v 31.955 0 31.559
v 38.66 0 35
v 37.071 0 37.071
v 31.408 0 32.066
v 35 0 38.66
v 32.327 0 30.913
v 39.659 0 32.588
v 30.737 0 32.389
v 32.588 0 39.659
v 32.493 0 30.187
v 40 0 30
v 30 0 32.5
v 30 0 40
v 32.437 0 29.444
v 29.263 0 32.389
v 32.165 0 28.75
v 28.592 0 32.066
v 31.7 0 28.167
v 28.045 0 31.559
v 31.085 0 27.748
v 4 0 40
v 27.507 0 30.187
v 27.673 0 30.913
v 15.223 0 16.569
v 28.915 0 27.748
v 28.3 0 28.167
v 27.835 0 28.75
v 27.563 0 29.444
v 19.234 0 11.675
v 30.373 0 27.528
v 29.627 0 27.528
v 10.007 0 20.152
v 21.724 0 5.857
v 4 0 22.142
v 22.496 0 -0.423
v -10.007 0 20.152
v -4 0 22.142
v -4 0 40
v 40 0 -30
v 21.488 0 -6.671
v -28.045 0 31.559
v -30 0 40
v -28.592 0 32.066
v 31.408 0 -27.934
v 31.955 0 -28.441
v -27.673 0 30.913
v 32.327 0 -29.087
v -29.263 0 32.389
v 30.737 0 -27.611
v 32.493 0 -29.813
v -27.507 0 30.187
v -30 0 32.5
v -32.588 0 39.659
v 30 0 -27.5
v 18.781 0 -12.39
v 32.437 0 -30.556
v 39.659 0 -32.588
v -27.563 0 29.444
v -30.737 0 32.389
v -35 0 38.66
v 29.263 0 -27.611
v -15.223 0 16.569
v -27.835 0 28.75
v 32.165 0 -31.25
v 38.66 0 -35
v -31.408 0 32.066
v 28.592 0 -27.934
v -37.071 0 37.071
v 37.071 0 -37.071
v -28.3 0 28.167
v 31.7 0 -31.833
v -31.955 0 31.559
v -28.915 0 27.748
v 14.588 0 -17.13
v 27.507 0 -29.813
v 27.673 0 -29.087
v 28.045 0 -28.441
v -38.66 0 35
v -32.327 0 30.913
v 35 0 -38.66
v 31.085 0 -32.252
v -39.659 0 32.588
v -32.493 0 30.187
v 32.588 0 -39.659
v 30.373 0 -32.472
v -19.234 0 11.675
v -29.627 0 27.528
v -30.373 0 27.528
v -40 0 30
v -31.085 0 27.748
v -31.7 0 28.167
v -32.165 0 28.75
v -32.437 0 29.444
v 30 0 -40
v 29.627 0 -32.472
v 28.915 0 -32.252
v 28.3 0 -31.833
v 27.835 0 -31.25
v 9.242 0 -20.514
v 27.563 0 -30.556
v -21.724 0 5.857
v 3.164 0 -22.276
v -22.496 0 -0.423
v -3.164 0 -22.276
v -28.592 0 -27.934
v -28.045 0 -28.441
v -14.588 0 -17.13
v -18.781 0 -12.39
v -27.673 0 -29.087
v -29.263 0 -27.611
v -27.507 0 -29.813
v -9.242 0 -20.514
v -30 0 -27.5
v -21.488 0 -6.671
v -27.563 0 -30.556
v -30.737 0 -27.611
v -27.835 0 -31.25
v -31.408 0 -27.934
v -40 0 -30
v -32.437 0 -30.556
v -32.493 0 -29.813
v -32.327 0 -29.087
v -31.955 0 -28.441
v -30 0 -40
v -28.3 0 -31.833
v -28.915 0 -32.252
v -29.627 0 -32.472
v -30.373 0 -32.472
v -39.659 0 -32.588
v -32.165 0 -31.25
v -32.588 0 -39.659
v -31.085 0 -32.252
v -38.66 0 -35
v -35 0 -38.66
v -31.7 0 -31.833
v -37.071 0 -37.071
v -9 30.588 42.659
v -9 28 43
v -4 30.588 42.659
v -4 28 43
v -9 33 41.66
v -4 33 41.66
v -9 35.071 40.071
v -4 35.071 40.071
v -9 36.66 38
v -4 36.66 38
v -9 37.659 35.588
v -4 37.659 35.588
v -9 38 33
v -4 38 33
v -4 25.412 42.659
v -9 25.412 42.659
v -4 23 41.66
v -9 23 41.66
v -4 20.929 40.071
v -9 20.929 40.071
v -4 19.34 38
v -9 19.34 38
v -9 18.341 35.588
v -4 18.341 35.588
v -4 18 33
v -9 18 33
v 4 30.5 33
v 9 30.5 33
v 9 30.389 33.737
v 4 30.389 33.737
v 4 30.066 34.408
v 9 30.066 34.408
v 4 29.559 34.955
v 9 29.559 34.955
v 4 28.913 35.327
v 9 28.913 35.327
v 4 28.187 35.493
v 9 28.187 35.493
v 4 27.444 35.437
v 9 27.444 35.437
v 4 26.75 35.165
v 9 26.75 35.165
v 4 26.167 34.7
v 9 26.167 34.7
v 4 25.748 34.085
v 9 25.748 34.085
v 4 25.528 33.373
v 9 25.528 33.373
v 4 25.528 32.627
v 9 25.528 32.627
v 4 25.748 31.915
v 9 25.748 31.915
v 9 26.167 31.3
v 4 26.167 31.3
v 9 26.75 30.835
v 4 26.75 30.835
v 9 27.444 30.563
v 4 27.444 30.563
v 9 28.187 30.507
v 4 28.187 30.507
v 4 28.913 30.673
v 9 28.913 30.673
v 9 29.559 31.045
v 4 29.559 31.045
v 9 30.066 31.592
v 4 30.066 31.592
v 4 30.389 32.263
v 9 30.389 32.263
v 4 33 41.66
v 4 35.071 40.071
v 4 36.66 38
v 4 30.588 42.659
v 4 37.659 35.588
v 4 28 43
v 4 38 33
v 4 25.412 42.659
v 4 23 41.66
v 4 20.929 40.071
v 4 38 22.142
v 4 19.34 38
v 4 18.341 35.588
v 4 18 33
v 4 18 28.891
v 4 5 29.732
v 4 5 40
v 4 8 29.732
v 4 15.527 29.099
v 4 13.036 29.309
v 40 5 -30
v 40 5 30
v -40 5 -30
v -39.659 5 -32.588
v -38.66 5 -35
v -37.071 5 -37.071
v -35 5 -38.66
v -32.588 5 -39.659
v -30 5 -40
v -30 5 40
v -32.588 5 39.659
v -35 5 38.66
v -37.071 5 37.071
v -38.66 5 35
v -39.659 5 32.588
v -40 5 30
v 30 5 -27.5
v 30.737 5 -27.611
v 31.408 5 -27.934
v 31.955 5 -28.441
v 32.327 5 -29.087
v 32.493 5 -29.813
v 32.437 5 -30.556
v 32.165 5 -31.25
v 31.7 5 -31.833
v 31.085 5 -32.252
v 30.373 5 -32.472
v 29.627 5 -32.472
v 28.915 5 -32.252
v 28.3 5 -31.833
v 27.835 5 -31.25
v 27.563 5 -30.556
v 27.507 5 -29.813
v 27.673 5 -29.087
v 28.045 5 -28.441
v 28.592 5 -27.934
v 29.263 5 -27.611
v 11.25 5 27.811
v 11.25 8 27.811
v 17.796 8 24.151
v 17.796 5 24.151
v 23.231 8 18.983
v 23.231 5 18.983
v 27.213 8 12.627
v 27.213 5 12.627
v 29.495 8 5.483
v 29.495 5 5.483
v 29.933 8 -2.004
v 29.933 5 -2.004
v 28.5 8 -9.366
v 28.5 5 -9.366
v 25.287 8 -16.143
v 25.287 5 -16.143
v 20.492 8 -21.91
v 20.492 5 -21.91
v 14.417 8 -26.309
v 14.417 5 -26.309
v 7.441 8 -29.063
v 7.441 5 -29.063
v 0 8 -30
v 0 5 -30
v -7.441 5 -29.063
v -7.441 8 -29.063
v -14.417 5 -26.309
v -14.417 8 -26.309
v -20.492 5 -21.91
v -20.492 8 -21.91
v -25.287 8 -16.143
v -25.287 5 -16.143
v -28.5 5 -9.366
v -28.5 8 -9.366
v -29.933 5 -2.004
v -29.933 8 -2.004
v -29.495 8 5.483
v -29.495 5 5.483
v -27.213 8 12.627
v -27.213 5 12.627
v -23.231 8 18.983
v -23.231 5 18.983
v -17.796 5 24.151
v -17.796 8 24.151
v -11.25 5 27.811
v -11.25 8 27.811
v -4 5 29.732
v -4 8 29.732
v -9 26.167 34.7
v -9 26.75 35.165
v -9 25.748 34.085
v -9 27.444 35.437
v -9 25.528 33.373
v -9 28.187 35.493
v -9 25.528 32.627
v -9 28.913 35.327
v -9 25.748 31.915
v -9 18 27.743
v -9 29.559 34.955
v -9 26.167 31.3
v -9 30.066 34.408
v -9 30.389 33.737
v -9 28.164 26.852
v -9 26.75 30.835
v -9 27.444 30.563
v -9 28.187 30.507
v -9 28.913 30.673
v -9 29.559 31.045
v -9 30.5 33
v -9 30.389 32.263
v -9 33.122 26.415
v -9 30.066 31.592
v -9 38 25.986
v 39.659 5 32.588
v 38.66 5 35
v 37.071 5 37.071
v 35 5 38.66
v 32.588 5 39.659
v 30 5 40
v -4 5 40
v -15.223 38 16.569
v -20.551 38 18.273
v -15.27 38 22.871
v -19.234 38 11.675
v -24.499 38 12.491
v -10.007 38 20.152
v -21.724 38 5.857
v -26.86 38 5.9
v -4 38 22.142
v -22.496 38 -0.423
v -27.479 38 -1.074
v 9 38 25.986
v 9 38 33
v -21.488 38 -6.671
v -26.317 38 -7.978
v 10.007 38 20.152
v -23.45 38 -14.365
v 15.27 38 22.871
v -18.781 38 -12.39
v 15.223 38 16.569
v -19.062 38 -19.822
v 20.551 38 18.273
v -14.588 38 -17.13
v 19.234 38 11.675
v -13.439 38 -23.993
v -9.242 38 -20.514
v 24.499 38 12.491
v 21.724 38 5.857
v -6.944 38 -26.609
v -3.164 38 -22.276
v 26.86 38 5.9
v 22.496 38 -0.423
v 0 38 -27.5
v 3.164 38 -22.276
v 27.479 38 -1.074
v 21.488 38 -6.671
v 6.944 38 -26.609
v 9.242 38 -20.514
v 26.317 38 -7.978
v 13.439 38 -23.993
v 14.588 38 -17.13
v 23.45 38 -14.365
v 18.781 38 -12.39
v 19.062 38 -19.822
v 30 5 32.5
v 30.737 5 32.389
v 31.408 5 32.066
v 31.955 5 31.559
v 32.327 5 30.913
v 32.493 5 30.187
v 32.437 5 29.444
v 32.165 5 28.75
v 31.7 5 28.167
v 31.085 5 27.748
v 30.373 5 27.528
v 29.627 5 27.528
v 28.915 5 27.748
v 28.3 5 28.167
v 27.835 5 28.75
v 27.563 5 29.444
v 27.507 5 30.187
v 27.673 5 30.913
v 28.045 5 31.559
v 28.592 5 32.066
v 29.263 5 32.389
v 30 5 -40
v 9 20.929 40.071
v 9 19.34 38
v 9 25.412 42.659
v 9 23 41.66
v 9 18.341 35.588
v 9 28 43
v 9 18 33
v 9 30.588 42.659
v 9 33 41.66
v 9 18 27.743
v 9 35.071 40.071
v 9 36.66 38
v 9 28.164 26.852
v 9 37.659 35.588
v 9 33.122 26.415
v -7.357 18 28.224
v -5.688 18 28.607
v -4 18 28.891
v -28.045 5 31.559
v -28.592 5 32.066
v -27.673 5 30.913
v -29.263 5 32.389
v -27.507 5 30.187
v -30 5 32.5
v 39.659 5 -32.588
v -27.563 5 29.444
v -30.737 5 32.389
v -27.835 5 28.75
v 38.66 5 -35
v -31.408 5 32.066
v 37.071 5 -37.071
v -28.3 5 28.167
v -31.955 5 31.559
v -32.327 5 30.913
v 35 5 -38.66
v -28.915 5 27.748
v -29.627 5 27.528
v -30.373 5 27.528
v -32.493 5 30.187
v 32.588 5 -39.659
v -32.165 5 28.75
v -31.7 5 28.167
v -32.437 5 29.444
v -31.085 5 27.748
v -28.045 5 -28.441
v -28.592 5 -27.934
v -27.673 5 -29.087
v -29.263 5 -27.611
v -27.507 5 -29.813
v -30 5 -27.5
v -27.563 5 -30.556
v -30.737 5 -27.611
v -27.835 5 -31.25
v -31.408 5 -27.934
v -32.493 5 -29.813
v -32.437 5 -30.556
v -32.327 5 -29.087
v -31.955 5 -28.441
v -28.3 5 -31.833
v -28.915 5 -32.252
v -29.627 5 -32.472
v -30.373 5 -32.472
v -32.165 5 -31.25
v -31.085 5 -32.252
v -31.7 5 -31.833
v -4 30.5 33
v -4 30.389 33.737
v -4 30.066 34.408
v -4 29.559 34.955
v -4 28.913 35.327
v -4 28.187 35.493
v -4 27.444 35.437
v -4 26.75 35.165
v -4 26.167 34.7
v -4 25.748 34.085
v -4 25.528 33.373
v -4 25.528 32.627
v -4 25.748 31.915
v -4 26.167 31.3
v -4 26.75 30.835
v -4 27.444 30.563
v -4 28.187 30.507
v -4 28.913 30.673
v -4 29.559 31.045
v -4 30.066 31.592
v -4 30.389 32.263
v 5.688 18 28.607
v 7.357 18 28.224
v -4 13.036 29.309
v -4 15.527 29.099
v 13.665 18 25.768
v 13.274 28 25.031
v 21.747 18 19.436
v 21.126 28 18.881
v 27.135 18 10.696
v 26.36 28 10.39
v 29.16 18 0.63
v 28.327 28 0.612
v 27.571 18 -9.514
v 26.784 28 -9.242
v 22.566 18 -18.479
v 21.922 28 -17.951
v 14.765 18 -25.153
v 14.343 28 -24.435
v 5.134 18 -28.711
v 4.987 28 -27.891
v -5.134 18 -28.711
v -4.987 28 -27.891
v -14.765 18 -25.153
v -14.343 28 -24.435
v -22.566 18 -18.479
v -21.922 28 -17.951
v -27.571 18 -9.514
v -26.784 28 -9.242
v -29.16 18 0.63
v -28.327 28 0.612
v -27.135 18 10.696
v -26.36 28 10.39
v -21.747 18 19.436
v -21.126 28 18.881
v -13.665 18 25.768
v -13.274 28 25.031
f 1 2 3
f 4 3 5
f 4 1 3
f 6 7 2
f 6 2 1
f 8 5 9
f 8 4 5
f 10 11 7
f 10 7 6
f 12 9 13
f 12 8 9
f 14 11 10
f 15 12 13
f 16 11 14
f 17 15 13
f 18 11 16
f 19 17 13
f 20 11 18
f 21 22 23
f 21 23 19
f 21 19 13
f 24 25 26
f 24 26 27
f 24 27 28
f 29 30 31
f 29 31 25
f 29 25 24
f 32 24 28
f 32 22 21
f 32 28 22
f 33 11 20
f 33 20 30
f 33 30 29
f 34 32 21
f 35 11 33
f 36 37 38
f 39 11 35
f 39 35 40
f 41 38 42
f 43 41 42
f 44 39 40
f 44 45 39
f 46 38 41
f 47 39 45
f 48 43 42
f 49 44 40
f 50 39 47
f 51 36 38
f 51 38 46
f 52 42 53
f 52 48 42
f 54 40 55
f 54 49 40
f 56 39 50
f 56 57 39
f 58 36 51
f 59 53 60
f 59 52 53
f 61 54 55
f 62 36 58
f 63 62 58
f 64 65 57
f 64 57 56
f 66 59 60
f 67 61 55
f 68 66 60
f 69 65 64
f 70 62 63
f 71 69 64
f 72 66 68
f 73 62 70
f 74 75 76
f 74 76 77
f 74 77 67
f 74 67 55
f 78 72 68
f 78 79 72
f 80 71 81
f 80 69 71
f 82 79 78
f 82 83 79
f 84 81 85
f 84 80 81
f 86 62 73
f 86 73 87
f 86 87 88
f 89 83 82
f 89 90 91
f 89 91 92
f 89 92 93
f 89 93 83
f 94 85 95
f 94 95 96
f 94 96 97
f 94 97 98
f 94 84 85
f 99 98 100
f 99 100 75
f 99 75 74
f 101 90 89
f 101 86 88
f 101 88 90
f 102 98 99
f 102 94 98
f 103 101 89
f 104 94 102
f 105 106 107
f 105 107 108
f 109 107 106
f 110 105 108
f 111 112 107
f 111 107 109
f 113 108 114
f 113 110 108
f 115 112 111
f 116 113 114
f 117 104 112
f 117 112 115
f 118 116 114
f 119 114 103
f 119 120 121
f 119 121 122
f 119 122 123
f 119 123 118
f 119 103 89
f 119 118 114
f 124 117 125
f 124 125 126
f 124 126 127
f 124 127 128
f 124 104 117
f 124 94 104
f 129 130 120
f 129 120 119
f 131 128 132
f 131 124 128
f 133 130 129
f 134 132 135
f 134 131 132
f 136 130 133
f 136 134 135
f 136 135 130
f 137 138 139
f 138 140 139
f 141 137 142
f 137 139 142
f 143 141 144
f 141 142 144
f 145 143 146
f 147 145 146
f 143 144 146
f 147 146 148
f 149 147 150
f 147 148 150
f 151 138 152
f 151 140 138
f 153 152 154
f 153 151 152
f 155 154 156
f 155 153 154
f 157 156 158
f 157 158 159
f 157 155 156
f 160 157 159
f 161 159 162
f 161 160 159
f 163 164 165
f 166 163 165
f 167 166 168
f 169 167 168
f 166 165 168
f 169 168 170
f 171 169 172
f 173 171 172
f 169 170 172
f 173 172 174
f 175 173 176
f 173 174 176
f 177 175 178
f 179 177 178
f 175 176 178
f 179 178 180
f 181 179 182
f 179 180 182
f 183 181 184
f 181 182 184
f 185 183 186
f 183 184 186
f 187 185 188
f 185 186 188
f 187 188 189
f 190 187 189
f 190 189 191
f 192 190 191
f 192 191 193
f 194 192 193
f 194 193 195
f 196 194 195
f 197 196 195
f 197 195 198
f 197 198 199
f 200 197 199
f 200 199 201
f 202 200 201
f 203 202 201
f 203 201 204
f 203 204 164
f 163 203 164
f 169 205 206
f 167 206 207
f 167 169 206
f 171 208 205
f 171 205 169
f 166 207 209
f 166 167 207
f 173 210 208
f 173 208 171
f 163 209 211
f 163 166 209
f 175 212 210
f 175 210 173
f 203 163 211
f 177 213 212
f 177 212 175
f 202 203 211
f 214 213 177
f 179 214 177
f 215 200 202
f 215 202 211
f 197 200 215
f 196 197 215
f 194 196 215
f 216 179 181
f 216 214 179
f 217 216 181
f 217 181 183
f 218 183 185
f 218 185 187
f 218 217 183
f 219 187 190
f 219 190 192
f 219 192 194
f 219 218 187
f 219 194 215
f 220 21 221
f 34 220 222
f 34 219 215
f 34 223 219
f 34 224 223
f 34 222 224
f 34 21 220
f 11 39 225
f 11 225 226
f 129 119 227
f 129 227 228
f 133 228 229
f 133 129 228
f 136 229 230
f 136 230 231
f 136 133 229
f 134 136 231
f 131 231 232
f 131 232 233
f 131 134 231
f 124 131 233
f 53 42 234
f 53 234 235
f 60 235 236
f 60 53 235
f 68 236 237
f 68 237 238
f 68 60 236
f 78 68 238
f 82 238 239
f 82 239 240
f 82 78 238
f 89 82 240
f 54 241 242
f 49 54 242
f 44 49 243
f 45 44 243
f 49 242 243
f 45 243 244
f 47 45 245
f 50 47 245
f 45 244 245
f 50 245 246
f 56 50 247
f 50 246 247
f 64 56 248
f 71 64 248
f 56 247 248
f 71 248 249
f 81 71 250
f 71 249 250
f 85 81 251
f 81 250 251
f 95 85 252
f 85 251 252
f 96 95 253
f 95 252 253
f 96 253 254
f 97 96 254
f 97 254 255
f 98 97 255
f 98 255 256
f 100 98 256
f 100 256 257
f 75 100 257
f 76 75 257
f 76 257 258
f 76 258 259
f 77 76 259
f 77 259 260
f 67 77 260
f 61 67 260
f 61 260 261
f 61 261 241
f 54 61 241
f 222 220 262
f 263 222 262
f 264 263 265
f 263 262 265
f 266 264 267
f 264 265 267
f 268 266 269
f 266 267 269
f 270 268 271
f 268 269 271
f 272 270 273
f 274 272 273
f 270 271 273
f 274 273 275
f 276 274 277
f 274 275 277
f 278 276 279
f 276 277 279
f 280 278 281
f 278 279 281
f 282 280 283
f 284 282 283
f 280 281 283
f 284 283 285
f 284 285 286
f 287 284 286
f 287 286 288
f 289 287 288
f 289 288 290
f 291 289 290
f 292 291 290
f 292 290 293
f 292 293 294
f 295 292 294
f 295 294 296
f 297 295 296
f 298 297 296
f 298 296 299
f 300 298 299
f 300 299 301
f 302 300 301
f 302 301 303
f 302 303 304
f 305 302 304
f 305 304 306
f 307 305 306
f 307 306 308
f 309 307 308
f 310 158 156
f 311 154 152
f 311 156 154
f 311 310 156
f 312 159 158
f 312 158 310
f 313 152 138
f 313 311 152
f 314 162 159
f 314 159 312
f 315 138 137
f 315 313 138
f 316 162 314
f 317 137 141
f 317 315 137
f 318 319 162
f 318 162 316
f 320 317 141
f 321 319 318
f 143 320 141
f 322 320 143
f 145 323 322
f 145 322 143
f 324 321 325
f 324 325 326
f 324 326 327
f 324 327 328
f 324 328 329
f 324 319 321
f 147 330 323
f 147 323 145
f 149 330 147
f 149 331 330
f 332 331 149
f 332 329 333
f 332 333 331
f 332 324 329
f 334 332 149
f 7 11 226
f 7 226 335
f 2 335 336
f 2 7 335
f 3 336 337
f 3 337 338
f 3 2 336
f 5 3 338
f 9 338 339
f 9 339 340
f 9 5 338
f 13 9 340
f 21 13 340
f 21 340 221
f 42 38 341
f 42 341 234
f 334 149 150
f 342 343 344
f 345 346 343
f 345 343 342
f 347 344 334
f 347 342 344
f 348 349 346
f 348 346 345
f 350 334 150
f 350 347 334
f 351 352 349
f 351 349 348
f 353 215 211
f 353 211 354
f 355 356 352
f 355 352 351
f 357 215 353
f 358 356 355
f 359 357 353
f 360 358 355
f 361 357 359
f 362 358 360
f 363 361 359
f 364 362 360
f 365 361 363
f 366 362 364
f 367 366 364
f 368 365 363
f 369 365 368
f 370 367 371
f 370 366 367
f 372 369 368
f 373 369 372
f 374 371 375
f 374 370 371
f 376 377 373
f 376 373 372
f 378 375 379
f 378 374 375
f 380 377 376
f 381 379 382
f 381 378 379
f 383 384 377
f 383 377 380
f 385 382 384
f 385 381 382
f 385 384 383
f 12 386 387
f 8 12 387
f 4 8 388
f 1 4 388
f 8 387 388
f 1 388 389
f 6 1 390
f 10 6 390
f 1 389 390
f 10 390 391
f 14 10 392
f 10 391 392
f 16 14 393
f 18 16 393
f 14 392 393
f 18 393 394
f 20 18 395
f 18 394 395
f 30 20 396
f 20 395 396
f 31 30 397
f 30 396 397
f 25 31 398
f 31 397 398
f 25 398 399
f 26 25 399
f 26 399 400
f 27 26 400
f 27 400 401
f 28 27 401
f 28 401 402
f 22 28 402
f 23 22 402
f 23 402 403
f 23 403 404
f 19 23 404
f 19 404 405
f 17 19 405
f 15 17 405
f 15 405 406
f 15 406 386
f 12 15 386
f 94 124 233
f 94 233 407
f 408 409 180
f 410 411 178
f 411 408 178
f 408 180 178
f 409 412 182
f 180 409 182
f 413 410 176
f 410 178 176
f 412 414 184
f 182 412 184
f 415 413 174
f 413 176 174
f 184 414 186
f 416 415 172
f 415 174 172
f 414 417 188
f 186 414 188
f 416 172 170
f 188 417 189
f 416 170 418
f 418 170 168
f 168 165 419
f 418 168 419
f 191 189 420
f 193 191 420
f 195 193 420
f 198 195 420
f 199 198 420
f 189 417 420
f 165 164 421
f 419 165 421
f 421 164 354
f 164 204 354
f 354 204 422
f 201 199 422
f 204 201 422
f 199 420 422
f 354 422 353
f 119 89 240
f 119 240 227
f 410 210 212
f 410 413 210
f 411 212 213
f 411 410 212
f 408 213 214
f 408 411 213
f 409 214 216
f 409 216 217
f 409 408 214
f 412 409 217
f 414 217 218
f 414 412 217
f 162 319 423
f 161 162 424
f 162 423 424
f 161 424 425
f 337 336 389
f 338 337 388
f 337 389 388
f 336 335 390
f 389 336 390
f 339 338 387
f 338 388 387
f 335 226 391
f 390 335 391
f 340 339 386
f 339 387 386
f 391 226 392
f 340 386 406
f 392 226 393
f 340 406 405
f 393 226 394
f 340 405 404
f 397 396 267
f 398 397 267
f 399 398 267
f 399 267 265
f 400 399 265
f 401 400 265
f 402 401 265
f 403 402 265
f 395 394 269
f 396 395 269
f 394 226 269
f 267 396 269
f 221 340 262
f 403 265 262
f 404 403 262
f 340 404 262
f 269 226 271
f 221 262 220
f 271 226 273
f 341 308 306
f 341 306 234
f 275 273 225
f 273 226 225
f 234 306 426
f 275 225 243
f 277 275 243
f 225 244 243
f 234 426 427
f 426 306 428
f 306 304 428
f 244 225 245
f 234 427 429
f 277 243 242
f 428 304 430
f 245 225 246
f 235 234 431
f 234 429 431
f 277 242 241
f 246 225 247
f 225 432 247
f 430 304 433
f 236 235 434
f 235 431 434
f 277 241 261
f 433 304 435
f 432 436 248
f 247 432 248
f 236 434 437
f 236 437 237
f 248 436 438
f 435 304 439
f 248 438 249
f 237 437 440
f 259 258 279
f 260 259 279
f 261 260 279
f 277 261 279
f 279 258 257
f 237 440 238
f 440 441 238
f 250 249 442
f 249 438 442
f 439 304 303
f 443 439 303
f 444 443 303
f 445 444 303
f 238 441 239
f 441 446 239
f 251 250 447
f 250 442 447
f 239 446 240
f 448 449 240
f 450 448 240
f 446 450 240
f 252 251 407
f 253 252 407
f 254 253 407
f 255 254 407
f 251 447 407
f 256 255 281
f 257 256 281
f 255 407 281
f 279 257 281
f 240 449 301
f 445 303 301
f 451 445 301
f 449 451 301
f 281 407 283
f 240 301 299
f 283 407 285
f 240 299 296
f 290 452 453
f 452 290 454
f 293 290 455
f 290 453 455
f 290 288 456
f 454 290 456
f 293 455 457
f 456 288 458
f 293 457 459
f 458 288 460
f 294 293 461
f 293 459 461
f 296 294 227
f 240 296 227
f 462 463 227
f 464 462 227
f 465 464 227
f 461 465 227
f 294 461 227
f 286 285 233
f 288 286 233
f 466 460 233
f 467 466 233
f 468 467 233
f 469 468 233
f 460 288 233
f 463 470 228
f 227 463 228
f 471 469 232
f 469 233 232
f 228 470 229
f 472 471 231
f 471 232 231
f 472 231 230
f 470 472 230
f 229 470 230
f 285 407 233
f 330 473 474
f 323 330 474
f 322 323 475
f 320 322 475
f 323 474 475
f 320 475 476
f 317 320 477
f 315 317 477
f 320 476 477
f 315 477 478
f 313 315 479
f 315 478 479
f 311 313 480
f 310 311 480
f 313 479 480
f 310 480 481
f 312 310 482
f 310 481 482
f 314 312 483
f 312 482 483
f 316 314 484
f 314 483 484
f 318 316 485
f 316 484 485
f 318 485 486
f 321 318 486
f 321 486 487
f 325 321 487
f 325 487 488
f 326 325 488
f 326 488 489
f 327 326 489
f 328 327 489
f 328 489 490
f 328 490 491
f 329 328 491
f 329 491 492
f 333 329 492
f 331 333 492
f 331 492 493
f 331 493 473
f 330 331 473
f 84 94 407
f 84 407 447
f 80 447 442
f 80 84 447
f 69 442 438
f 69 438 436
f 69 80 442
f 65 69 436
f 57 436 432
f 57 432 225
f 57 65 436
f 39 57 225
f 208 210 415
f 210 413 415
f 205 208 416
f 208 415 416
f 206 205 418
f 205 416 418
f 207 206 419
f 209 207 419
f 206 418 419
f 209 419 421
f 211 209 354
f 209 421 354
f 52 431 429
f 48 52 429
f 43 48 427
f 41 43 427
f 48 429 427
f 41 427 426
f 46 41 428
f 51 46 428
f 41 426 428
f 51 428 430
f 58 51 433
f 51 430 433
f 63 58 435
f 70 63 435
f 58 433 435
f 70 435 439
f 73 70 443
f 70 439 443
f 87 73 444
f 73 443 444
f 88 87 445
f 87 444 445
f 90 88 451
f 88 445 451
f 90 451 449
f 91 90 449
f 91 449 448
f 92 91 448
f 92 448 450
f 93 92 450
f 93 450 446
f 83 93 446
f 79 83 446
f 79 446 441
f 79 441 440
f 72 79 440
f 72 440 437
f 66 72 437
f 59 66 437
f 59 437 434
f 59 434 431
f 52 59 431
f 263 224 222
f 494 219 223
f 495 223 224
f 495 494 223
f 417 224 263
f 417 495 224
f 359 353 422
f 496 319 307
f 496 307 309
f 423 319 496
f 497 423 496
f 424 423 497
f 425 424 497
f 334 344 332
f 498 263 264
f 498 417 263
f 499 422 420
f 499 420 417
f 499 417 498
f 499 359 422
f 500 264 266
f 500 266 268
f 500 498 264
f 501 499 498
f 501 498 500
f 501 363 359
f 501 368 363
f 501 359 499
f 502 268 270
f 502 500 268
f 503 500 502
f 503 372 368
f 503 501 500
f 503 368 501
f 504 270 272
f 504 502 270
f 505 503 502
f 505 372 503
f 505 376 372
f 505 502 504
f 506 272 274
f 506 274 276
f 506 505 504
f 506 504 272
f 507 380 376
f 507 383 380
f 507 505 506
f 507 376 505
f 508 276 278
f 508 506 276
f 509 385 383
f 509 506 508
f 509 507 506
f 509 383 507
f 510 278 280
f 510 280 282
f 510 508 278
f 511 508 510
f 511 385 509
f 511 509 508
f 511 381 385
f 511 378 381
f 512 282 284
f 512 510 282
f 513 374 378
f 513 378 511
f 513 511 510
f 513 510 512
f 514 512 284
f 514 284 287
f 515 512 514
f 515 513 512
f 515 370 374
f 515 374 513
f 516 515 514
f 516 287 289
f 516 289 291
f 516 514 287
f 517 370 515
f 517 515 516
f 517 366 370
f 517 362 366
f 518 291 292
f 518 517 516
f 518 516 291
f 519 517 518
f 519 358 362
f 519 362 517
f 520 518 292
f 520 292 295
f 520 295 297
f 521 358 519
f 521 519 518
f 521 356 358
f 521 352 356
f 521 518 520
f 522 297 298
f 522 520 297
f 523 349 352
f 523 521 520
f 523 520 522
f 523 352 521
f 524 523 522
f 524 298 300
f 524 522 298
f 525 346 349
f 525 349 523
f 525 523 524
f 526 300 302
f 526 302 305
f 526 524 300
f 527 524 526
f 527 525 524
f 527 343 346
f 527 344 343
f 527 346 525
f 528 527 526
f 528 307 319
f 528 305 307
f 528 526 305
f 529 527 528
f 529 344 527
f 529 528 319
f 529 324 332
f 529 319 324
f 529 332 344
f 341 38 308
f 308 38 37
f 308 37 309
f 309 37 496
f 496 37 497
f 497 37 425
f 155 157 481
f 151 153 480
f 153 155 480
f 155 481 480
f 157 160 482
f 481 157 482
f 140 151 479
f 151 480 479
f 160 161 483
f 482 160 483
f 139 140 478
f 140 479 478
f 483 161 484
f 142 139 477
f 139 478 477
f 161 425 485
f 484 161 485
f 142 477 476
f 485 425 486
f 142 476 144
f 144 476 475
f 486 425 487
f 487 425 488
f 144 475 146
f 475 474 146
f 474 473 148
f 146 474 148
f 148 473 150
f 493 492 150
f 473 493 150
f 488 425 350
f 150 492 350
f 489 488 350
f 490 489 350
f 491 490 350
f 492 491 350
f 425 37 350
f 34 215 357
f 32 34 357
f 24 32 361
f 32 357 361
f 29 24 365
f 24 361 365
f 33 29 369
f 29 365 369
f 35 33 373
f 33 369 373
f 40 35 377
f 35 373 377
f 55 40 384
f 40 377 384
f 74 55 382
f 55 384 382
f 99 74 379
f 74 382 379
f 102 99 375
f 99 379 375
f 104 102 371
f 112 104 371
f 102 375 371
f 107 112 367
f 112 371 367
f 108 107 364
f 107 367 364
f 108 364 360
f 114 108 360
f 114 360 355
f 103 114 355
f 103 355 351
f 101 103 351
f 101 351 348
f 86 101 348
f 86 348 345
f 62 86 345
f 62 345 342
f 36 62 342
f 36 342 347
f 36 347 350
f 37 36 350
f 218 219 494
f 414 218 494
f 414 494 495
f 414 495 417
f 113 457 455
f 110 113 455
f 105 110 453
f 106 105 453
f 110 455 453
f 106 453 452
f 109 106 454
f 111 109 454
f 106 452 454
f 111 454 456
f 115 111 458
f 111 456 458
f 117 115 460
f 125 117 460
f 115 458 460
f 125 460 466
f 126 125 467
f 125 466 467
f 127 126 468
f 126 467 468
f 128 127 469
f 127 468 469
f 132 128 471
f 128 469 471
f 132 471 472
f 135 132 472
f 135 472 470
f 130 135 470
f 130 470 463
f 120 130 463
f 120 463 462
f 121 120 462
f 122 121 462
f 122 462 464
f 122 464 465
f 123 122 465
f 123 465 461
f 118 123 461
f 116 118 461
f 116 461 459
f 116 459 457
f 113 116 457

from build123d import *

# Parameters (mm, degrees)
BOSS_EXTRUDE1_DEPTH     = 5
SKETCH2_R               = 30
BOSS_EXTRUDE2_DEPTH     = 3
SKETCH3_R               = 27.5
BOSS_EXTRUDE3_DEPTH     = 30
SKETCH4_R               = 22.5
CUT_EXTRUDE1_DEPTH      = 69.14690015
SKETCH6_R               = 22.5
CUT_EXTRUDE2_DEPTH      = 69.14690015
CUT_EXTRUDE5_DEPTH      = 69.146900205
CUT_EXTRUDE5_DEPTH_BACK = 13
SKETCH7_W               = 8
SKETCH7_H               = 27.467309478
SKETCH8_W               = 5
SKETCH8_H               = 20
BOSS_EXTRUDE4_DEPTH     = 43
FILLET1_R               = 10
SKETCH9_R               = 2.5
CUT_EXTRUDE6_DEPTH      = 43
SKETCH10_R              = 22.5
CUT_EXTRUDE7_DEPTH      = 43
SKETCH11_R              = 2.5
CUT_EXTRUDE8_DEPTH      = 10


with BuildPart() as part:
    # Sketch1 → Boss-Extrude1 (new body)
    with BuildSketch(Plane(origin=(0, 0, 0), x_dir=(1, 0, 0), z_dir=(0, 1, 0))):
        with BuildLine():
            Line((30, -40), (-30, -40))
            ThreePointArc((-30, -40), (-37.071067812, -37.071067812), (-40, -30))
            Line((-40, -30), (-40, 30))
            ThreePointArc((-40, 30), (-37.071067812, 37.071067812), (-30, 40))
            Line((-30, 40), (30, 40))
            ThreePointArc((30, 40), (37.071067812, 37.071067812), (40, 30))
            Line((40, 30), (40, -30))
            ThreePointArc((40, -30), (37.071067812, -37.071067812), (30, -40))
        make_face()
    extrude(amount=BOSS_EXTRUDE1_DEPTH)

    # Sketch2 → Boss-Extrude2 (add)
    with BuildSketch(Plane(origin=(0, 5, 0), x_dir=(1, 0, 0), z_dir=(0, 1, 0))):
        with Locations(Location((0, 0, 0), (0, 0, 270))):
            Circle(SKETCH2_R)
    extrude(amount=BOSS_EXTRUDE2_DEPTH)

    # Sketch3 → Boss-Extrude3 (add)
    with BuildSketch(Plane(origin=(0, 8, 0), x_dir=(1, 0, 0), z_dir=(0, 1, 0))):
        with Locations(Location((0, 0, 0), (0, 0, 270))):
            Circle(SKETCH3_R)
    extrude(amount=BOSS_EXTRUDE3_DEPTH)

    # Sketch4 → Cut-Extrude1 (cut, through all)
    with BuildSketch(Plane(origin=(0, 38, 0), x_dir=(1, 0, 0), z_dir=(0, 1, 0))):
        with Locations(Location((0, 0, 0), (0, 0, 270))):
            Circle(SKETCH4_R)
    extrude(amount=-CUT_EXTRUDE1_DEPTH, mode=Mode.SUBTRACT)

    # loft up to a face of the part (loft1)
    loft([Face(Wire([part.edges().sort_by_distance((21.869058823, 8, -20.536413178))[0]])), Face(Wire([part.edges().sort_by_distance((-20.046637254, 38, -18.825045413))[0]]))])

    # Sketch6 → Cut-Extrude2 (cut, through all)
    with BuildSketch(Plane(origin=(0, 38, 0), x_dir=(1, 0, 0), z_dir=(0, 1, 0))):
        with Locations(Location((0, 0, 0), (0, 0, 270))):
            Circle(SKETCH6_R)
    extrude(amount=-CUT_EXTRUDE2_DEPTH, mode=Mode.SUBTRACT)

    # Sketch7 → Cut-Extrude5 (cut, two sides: drawn at the far end of the back side and taken through both)
    with BuildSketch(Plane(origin=(0, 0, 0), x_dir=(1, 0, 0), z_dir=(0, 1, 0)).offset(-CUT_EXTRUDE5_DEPTH_BACK)):
        with Locations((0, -26.266345261)):
            Rectangle(SKETCH7_W, SKETCH7_H)
    extrude(amount=CUT_EXTRUDE5_DEPTH + CUT_EXTRUDE5_DEPTH_BACK, mode=Mode.SUBTRACT)

    # Sketch8 → Boss-Extrude4 (add)
    with BuildSketch(Plane.XY):
        with Locations((-6.5, 28)):
            Rectangle(SKETCH8_W, SKETCH8_H)
        with Locations((6.5, 28)):
            Rectangle(SKETCH8_W, SKETCH8_H)
    extrude(amount=BOSS_EXTRUDE4_DEPTH)

    # Fillet1
    fillet1_edges = [part.edges().sort_by_distance(p)[0] for p in [
        (6.5, 18, 43),
        (-6.5, 18, 43),
        (6.5, 38, 43),
        (-6.5, 38, 43),
    ]]
    fillet(fillet1_edges, radius=FILLET1_R - 0.0001)  # a hair under: the kernel refuses the full size

    # Sketch9 → Cut-Extrude6 (cut)
    with BuildSketch(Plane(origin=(9, 0, 0), x_dir=(0, 0, -1), z_dir=(1, 0, 0))):
        with Locations(Location((-33, 28, 0), (0, 0, 90))):
            Circle(SKETCH9_R)
    extrude(amount=-CUT_EXTRUDE6_DEPTH, mode=Mode.SUBTRACT)

    # Sketch10 → Cut-Extrude7 (cut)
    with BuildSketch(Plane(origin=(0, 38, 0), x_dir=(1, 0, 0), z_dir=(0, 1, 0))):
        Circle(SKETCH10_R)
    extrude(amount=-CUT_EXTRUDE7_DEPTH, mode=Mode.SUBTRACT)

    # Sketch11 → Cut-Extrude8 (cut)
    with BuildSketch(Plane(origin=(0, 5, 0), x_dir=(1, 0, 0), z_dir=(0, 1, 0))):
        with Locations(Location((30, -30, 0), (0, 0, 270))):
            Circle(SKETCH11_R)
        with Locations(Location((-30, -30, 0), (0, 0, 270))):
            Circle(SKETCH11_R)
        with Locations(Location((30, 30, 0), (0, 0, 270))):
            Circle(SKETCH11_R)
        with Locations(Location((-30, 30, 0), (0, 0, 270))):
            Circle(SKETCH11_R)
    extrude(amount=-CUT_EXTRUDE8_DEPTH, mode=Mode.SUBTRACT)


solid = part.part
